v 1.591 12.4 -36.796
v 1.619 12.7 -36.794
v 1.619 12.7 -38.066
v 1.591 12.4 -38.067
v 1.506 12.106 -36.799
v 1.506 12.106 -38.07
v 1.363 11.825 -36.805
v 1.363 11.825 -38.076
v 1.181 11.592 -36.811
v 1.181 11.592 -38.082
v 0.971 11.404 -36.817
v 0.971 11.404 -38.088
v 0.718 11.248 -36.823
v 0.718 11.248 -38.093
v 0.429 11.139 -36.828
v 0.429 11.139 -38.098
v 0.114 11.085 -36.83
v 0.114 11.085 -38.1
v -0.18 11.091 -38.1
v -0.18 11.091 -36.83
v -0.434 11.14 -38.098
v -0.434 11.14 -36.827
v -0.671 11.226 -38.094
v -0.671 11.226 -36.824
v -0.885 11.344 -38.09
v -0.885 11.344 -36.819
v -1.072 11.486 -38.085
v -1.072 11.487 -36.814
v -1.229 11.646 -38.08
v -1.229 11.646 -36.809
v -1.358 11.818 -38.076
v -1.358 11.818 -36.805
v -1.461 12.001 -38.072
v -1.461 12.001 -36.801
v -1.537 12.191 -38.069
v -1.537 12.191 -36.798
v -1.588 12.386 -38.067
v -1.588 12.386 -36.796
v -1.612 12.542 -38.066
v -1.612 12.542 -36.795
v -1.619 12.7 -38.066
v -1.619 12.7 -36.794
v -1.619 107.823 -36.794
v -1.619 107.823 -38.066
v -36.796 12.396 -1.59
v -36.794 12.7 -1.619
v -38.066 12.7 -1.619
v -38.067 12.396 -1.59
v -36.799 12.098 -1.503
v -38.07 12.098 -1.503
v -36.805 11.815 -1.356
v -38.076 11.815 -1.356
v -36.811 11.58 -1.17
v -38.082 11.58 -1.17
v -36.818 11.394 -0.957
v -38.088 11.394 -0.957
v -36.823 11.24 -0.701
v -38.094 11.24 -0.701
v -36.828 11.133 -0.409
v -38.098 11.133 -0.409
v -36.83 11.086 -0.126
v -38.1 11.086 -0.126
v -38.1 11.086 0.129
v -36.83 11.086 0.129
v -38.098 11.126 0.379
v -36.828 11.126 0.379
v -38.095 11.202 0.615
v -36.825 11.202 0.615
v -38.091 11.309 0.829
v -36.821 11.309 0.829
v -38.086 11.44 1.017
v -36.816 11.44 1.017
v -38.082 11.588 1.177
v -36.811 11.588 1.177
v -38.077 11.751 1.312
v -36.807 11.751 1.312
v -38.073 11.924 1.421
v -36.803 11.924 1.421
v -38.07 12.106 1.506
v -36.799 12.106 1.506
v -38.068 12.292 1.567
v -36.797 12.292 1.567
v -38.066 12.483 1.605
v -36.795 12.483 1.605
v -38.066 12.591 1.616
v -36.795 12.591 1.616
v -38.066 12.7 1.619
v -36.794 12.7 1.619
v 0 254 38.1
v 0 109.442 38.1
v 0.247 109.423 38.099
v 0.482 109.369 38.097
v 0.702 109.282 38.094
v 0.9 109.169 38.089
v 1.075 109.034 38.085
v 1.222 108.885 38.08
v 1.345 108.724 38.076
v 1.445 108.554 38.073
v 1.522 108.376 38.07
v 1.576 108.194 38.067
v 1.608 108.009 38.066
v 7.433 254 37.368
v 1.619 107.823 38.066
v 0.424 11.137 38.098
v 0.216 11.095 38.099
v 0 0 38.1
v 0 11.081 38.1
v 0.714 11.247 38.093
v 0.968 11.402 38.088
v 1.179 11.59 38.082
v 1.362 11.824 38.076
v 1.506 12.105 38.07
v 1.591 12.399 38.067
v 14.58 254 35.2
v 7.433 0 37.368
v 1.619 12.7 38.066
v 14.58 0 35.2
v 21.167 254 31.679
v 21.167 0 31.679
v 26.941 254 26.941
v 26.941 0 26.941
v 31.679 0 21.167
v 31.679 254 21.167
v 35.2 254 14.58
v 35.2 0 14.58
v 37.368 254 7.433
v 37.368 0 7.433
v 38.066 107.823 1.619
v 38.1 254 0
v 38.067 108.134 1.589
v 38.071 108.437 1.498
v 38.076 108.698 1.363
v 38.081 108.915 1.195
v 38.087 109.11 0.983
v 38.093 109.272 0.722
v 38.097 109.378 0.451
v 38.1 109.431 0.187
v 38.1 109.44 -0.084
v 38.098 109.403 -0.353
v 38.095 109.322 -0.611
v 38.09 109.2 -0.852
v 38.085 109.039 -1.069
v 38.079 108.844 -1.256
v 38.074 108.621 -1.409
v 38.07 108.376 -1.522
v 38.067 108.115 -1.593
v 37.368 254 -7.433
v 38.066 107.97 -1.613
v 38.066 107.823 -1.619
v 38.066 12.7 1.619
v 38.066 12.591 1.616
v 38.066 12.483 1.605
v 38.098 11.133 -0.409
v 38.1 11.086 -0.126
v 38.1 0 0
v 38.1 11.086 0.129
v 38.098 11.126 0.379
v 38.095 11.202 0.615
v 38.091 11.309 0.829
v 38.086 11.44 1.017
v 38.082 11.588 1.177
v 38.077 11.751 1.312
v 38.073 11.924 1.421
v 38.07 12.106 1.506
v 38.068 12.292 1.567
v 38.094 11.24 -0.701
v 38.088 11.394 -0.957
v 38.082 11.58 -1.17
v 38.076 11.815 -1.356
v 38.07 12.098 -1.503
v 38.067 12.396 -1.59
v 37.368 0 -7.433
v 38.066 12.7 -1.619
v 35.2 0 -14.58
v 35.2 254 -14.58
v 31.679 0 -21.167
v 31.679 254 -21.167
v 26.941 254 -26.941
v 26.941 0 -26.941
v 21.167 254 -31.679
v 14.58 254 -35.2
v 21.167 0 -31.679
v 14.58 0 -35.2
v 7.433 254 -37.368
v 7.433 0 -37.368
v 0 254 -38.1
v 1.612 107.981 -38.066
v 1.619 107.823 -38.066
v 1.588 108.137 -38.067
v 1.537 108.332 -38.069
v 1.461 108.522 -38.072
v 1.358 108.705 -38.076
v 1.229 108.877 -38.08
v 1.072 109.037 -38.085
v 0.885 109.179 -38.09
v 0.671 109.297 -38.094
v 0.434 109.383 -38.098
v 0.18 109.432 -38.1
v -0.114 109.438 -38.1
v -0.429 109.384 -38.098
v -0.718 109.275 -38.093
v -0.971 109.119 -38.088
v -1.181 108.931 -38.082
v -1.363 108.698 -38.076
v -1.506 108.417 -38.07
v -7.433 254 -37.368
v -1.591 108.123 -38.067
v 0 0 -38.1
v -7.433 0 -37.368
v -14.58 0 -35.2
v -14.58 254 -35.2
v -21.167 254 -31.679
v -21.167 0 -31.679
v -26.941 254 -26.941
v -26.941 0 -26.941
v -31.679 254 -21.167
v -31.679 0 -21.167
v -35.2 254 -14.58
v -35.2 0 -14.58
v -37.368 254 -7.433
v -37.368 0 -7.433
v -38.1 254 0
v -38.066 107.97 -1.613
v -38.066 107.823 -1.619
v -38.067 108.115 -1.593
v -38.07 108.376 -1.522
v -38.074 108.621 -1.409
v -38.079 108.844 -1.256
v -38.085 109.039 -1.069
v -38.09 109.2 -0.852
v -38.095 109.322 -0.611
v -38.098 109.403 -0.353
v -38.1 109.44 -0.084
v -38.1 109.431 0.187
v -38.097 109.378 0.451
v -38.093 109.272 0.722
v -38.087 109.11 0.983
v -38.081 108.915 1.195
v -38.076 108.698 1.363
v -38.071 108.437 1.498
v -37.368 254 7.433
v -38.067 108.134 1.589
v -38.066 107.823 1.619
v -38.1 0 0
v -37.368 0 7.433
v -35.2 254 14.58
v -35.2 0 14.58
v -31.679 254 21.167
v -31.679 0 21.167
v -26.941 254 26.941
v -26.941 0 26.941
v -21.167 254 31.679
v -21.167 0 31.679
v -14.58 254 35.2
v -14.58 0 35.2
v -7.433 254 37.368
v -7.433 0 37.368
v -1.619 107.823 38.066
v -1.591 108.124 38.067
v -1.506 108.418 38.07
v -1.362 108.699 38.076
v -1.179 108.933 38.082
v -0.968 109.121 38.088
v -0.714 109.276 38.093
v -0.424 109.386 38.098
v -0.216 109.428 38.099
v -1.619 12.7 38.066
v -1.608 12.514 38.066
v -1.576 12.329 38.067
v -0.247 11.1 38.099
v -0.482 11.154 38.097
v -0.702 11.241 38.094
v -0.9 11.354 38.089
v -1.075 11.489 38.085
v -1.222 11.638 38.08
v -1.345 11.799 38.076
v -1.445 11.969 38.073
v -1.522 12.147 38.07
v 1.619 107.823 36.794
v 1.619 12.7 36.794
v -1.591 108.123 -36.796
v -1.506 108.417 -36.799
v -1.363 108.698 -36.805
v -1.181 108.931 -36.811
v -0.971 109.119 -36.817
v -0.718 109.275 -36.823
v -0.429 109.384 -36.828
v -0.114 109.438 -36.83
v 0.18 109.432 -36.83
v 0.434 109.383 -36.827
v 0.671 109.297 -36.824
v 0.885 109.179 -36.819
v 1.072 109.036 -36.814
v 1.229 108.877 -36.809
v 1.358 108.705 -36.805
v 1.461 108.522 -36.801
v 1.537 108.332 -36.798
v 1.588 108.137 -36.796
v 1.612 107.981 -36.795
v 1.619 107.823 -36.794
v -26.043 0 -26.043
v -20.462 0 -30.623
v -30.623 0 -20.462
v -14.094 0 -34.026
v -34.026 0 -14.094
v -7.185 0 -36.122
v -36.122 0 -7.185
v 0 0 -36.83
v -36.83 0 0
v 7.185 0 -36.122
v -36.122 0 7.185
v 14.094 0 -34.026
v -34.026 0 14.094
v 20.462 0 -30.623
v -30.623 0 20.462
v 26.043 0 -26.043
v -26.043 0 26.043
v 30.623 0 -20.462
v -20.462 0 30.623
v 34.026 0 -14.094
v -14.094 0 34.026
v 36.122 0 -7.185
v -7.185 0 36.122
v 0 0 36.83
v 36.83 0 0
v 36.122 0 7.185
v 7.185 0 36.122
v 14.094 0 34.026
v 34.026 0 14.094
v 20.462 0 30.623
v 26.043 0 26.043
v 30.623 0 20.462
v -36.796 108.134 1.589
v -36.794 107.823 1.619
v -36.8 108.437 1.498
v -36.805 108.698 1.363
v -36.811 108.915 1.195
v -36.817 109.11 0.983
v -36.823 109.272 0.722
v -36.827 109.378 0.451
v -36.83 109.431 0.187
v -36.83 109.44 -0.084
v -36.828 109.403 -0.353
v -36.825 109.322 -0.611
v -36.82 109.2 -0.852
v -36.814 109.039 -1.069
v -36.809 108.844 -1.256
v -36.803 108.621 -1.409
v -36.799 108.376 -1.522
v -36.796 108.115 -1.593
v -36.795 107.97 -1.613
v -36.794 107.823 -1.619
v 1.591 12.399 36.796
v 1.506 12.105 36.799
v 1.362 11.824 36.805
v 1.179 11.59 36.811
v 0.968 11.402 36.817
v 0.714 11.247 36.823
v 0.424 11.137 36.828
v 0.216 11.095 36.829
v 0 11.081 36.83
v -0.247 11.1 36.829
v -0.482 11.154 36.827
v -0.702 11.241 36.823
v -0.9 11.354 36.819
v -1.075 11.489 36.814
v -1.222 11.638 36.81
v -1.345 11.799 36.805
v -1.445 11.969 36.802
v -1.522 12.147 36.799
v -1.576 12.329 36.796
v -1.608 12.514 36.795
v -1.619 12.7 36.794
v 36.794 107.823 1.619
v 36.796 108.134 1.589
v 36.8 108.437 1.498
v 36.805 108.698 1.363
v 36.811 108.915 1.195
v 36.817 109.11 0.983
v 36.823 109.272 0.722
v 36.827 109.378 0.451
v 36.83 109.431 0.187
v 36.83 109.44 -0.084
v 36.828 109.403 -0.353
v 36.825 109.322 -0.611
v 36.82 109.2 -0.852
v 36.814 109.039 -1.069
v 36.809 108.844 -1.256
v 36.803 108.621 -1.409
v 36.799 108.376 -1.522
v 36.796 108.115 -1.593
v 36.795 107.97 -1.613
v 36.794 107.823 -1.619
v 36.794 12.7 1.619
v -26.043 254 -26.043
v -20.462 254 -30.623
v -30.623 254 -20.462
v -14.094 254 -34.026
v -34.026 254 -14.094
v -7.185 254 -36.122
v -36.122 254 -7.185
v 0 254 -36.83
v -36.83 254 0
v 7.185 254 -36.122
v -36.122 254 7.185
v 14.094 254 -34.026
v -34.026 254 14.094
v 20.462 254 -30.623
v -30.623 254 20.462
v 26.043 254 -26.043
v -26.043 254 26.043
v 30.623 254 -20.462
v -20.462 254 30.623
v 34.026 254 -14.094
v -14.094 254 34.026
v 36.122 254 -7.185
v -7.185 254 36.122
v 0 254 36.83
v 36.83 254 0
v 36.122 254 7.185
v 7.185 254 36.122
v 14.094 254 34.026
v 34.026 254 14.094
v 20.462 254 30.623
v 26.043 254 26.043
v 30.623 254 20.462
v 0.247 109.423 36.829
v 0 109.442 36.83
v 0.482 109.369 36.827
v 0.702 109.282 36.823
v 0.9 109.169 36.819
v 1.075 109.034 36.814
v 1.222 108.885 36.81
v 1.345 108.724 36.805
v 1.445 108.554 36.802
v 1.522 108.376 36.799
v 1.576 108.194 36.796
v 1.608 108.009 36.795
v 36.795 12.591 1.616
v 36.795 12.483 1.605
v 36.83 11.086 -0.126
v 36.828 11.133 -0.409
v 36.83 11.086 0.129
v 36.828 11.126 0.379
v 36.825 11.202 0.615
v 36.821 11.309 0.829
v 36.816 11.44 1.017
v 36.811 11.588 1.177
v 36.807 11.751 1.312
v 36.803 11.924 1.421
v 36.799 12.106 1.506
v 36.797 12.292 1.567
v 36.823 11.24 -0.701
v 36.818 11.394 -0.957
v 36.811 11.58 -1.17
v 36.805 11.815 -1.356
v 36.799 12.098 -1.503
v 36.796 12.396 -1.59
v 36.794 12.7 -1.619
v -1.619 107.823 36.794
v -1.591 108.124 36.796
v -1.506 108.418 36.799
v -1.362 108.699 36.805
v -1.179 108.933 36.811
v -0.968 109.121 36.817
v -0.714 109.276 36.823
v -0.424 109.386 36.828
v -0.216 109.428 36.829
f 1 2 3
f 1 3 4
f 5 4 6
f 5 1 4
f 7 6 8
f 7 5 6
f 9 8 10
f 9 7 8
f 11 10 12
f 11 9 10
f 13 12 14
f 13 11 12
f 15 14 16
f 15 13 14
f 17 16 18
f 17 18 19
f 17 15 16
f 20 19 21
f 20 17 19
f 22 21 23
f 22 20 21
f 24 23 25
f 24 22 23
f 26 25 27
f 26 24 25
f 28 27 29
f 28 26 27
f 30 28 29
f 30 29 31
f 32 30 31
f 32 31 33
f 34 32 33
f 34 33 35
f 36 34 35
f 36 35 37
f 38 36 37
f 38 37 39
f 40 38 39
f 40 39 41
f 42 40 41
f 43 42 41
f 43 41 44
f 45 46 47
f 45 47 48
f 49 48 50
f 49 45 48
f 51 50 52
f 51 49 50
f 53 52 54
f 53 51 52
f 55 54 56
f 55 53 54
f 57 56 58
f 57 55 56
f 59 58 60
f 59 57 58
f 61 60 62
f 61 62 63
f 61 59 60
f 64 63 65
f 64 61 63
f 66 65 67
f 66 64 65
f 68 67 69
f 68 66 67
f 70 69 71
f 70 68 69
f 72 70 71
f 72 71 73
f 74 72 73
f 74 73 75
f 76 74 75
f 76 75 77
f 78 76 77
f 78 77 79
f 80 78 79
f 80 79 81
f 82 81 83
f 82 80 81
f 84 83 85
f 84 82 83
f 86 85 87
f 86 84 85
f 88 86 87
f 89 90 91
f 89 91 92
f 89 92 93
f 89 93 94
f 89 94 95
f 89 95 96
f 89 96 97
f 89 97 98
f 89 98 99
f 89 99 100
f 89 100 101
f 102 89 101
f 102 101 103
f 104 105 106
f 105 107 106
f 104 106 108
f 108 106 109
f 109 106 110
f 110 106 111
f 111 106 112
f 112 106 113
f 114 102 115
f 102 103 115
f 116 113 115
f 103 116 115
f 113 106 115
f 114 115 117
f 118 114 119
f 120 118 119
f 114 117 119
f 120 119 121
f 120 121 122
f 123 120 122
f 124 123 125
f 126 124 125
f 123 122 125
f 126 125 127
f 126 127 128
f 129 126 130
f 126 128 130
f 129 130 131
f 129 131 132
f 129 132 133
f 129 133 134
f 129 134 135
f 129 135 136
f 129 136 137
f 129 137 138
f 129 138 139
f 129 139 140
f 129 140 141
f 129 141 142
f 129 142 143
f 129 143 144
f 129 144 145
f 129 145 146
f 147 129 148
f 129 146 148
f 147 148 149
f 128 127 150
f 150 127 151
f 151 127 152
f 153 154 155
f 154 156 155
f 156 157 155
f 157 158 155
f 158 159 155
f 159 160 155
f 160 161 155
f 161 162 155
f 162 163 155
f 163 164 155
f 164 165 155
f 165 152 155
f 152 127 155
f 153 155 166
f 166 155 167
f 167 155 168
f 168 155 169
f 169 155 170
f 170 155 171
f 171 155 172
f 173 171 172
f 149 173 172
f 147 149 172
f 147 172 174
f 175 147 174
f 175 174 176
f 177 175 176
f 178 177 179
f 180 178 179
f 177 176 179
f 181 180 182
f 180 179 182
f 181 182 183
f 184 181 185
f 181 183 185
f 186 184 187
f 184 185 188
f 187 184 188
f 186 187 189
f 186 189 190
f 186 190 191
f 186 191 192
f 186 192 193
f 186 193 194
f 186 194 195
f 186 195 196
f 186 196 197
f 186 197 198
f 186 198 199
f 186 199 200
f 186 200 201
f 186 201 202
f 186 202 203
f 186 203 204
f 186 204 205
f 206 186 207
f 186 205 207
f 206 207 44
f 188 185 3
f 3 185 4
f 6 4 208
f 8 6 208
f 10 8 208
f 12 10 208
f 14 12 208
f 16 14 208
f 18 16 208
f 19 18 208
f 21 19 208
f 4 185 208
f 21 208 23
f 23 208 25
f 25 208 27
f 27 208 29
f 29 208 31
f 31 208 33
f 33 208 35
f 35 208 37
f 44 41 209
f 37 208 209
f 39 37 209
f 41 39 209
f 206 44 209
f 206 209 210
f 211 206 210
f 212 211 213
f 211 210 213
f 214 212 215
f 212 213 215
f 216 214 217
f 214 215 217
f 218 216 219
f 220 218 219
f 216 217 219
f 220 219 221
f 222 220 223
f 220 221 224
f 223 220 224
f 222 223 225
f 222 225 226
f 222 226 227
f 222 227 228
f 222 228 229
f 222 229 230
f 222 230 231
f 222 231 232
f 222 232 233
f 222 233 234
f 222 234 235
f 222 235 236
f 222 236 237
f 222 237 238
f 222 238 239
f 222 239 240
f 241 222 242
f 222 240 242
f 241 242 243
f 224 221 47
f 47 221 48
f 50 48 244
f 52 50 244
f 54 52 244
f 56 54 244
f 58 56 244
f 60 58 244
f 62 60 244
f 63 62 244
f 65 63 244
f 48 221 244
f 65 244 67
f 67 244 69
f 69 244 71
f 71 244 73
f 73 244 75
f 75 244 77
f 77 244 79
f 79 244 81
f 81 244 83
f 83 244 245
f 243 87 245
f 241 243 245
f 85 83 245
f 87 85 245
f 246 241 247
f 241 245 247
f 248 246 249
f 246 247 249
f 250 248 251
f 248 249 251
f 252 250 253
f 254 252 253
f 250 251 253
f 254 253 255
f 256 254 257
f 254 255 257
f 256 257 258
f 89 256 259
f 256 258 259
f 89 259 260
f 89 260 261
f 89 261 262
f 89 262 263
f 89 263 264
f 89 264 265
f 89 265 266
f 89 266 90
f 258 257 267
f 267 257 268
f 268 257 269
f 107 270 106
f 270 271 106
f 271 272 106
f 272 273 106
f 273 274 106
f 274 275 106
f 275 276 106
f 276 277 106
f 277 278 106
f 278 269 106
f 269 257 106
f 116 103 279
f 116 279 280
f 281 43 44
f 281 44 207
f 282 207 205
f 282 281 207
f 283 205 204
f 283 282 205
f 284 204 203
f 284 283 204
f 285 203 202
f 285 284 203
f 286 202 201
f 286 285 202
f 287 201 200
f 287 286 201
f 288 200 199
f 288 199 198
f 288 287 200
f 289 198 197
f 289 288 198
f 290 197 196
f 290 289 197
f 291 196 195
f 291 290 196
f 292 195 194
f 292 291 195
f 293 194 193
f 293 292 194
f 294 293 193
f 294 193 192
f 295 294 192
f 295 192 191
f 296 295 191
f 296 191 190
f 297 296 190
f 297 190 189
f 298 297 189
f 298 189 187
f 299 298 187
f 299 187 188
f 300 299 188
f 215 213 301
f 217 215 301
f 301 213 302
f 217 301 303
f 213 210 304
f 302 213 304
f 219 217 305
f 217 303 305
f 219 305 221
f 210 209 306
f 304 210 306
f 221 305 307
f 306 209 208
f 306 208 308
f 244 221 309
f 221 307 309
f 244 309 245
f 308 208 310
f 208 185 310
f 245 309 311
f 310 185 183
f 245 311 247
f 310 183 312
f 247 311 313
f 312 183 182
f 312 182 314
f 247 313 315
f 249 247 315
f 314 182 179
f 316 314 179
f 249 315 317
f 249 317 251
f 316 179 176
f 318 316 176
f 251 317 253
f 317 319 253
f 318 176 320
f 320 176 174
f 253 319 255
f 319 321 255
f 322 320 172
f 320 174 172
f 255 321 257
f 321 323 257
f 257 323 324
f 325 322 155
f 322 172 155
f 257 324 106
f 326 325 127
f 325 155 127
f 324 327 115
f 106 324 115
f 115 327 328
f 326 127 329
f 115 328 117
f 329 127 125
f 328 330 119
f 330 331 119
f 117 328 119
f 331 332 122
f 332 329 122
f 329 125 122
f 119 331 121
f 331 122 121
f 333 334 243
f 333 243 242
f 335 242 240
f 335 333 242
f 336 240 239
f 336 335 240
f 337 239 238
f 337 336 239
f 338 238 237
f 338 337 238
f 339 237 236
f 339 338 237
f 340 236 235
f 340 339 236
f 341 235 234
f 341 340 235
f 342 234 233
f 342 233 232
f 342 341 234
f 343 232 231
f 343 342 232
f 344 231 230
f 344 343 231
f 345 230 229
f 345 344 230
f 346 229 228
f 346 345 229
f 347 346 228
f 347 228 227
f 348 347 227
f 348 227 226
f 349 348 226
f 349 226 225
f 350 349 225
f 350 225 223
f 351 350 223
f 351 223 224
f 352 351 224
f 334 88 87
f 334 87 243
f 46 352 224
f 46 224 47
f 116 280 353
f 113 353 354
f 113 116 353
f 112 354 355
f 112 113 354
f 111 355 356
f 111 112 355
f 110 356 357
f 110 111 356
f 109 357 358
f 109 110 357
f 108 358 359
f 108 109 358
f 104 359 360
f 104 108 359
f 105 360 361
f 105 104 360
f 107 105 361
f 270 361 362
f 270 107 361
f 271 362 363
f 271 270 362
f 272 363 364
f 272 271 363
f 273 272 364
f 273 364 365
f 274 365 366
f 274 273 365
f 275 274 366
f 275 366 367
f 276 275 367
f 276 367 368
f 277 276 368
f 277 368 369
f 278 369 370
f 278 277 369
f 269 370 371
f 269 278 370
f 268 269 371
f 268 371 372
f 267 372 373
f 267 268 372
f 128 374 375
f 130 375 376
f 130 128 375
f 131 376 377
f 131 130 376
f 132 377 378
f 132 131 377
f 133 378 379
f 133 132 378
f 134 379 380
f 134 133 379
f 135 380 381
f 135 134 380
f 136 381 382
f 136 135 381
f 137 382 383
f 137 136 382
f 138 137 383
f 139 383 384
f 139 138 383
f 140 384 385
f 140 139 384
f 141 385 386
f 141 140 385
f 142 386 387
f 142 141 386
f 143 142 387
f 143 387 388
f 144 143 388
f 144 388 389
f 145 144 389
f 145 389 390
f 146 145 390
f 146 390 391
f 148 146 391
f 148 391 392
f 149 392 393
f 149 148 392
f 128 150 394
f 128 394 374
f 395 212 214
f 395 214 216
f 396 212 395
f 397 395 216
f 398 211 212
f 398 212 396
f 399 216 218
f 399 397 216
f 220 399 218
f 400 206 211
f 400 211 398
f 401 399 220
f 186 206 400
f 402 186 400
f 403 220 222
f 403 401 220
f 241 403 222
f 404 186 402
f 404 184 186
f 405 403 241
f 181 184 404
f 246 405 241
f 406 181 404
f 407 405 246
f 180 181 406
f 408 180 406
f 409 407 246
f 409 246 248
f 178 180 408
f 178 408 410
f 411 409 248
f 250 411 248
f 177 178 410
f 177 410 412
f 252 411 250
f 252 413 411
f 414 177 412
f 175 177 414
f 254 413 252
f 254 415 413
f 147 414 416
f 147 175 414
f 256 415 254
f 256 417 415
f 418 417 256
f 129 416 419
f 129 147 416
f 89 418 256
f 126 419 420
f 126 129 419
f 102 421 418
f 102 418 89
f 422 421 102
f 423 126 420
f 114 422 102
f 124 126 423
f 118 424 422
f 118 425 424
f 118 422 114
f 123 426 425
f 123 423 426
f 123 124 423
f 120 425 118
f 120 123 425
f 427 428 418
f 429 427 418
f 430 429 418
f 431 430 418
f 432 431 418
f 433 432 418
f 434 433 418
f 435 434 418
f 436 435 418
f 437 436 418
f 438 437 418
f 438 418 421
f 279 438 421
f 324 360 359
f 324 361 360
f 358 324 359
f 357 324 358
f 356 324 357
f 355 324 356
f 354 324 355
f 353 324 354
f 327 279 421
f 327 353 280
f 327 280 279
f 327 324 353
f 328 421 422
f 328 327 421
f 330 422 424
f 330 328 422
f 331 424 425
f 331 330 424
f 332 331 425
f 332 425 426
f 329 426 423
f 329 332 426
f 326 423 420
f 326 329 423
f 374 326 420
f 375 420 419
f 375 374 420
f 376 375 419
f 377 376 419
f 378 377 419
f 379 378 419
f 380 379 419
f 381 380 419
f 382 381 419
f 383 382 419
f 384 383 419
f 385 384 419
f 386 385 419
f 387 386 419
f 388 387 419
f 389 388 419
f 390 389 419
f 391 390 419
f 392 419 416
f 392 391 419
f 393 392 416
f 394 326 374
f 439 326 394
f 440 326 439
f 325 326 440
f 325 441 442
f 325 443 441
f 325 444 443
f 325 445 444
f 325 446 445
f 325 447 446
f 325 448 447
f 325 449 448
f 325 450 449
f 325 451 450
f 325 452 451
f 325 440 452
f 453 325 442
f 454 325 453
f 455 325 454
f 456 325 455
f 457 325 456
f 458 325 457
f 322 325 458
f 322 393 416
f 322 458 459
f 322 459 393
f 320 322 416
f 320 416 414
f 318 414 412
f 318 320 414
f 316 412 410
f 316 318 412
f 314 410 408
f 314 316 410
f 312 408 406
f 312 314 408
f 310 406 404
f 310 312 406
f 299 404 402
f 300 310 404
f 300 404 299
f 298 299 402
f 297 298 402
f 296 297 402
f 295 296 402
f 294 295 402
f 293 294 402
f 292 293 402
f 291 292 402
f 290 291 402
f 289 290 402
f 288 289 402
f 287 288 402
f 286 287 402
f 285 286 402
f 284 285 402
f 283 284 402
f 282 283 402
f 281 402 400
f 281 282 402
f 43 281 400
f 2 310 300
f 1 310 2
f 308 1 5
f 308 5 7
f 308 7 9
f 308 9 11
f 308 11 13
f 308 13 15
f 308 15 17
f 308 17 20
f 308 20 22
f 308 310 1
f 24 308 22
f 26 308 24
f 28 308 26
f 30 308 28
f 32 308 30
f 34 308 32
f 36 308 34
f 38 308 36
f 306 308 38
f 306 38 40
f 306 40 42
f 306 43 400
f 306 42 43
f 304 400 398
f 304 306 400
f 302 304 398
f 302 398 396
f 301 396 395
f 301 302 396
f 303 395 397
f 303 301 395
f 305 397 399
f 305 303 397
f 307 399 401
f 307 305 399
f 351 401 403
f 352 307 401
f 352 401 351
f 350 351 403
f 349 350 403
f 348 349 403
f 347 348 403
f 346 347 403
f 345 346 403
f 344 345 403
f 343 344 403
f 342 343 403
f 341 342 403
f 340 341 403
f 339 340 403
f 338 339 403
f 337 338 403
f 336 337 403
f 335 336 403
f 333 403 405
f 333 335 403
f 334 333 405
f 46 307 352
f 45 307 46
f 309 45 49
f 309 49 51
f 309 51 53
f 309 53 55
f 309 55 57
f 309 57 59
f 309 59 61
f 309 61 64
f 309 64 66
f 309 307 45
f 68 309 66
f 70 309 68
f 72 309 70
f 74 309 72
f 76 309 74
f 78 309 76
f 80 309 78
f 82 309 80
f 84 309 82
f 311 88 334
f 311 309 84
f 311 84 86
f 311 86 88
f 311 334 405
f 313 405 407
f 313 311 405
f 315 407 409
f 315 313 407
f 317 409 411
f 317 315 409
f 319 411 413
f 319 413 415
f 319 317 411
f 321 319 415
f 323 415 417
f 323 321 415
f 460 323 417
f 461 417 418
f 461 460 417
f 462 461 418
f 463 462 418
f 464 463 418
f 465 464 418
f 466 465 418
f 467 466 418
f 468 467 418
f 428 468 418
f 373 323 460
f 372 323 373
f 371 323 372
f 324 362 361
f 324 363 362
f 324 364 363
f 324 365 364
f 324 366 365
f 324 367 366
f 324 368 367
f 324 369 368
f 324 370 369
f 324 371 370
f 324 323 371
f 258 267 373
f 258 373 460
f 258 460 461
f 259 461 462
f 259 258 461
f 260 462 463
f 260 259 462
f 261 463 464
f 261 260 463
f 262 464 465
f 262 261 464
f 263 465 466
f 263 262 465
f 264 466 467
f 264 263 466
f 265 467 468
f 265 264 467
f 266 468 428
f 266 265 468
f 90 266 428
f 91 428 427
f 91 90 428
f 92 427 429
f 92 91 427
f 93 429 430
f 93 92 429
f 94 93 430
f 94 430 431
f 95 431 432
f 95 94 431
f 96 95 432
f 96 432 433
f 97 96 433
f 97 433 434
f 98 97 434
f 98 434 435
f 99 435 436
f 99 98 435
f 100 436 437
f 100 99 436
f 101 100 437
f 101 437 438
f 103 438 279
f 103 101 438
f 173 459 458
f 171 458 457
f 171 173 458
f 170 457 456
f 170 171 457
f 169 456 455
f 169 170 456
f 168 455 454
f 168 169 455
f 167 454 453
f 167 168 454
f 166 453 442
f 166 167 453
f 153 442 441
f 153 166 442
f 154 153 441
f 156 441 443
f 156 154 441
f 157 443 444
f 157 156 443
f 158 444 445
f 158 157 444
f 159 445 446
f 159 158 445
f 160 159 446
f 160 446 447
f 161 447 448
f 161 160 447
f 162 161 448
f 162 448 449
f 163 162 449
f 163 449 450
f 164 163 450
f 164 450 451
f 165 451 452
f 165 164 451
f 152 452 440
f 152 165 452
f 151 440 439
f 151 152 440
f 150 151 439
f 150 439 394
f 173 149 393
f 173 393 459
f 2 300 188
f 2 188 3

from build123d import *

# Parameters (mm, degrees)
SKETCH1_R           = 38.1
SKETCH1_R_2         = 36.83
BOSS_EXTRUDE1_DEPTH = 254
CUT_EXTRUDE1_DEPTH  = 260.652113413
CIRPATTERN1_COUNT   = 2
CIRPATTERN1_ANGLE   = 90


with BuildPart() as part:
    # Sketch1 → Boss-Extrude1 (new body)
    with BuildSketch(Plane(origin=(0, 0, 0), x_dir=(1, 0, 0), z_dir=(0, 1, 0))):
        Circle(SKETCH1_R)
        Circle(SKETCH1_R_2, mode=Mode.SUBTRACT)
    extrude(amount=BOSS_EXTRUDE1_DEPTH)

    # Sketch2 → Cut-Extrude1 (cut, symmetric)
    with BuildSketch(Plane.XY):
        with BuildLine():
            Line((-1.61925, 12.7), (-1.61925, 107.823))
            ThreePointArc((-1.61925, 107.823), (0, 109.44225), (1.61925, 107.823))
            Line((1.61925, 107.823), (1.61925, 12.7))
            ThreePointArc((1.61925, 12.7), (0, 11.08075), (-1.61925, 12.7))
        make_face()
    cut_extrude1 = extrude(amount=CUT_EXTRUDE1_DEPTH, both=True, mode=Mode.SUBTRACT)

    # CirPattern1: Cut-Extrude1 ×2 about axis
    cirpattern1_axis = Axis((0, -12.7, 0), (0, 1, 0))
    for i in range(1, CIRPATTERN1_COUNT):
        add(cut_extrude1.rotate(cirpattern1_axis, i * CIRPATTERN1_ANGLE / (CIRPATTERN1_COUNT - 1)), mode=Mode.SUBTRACT)


solid = part.part
